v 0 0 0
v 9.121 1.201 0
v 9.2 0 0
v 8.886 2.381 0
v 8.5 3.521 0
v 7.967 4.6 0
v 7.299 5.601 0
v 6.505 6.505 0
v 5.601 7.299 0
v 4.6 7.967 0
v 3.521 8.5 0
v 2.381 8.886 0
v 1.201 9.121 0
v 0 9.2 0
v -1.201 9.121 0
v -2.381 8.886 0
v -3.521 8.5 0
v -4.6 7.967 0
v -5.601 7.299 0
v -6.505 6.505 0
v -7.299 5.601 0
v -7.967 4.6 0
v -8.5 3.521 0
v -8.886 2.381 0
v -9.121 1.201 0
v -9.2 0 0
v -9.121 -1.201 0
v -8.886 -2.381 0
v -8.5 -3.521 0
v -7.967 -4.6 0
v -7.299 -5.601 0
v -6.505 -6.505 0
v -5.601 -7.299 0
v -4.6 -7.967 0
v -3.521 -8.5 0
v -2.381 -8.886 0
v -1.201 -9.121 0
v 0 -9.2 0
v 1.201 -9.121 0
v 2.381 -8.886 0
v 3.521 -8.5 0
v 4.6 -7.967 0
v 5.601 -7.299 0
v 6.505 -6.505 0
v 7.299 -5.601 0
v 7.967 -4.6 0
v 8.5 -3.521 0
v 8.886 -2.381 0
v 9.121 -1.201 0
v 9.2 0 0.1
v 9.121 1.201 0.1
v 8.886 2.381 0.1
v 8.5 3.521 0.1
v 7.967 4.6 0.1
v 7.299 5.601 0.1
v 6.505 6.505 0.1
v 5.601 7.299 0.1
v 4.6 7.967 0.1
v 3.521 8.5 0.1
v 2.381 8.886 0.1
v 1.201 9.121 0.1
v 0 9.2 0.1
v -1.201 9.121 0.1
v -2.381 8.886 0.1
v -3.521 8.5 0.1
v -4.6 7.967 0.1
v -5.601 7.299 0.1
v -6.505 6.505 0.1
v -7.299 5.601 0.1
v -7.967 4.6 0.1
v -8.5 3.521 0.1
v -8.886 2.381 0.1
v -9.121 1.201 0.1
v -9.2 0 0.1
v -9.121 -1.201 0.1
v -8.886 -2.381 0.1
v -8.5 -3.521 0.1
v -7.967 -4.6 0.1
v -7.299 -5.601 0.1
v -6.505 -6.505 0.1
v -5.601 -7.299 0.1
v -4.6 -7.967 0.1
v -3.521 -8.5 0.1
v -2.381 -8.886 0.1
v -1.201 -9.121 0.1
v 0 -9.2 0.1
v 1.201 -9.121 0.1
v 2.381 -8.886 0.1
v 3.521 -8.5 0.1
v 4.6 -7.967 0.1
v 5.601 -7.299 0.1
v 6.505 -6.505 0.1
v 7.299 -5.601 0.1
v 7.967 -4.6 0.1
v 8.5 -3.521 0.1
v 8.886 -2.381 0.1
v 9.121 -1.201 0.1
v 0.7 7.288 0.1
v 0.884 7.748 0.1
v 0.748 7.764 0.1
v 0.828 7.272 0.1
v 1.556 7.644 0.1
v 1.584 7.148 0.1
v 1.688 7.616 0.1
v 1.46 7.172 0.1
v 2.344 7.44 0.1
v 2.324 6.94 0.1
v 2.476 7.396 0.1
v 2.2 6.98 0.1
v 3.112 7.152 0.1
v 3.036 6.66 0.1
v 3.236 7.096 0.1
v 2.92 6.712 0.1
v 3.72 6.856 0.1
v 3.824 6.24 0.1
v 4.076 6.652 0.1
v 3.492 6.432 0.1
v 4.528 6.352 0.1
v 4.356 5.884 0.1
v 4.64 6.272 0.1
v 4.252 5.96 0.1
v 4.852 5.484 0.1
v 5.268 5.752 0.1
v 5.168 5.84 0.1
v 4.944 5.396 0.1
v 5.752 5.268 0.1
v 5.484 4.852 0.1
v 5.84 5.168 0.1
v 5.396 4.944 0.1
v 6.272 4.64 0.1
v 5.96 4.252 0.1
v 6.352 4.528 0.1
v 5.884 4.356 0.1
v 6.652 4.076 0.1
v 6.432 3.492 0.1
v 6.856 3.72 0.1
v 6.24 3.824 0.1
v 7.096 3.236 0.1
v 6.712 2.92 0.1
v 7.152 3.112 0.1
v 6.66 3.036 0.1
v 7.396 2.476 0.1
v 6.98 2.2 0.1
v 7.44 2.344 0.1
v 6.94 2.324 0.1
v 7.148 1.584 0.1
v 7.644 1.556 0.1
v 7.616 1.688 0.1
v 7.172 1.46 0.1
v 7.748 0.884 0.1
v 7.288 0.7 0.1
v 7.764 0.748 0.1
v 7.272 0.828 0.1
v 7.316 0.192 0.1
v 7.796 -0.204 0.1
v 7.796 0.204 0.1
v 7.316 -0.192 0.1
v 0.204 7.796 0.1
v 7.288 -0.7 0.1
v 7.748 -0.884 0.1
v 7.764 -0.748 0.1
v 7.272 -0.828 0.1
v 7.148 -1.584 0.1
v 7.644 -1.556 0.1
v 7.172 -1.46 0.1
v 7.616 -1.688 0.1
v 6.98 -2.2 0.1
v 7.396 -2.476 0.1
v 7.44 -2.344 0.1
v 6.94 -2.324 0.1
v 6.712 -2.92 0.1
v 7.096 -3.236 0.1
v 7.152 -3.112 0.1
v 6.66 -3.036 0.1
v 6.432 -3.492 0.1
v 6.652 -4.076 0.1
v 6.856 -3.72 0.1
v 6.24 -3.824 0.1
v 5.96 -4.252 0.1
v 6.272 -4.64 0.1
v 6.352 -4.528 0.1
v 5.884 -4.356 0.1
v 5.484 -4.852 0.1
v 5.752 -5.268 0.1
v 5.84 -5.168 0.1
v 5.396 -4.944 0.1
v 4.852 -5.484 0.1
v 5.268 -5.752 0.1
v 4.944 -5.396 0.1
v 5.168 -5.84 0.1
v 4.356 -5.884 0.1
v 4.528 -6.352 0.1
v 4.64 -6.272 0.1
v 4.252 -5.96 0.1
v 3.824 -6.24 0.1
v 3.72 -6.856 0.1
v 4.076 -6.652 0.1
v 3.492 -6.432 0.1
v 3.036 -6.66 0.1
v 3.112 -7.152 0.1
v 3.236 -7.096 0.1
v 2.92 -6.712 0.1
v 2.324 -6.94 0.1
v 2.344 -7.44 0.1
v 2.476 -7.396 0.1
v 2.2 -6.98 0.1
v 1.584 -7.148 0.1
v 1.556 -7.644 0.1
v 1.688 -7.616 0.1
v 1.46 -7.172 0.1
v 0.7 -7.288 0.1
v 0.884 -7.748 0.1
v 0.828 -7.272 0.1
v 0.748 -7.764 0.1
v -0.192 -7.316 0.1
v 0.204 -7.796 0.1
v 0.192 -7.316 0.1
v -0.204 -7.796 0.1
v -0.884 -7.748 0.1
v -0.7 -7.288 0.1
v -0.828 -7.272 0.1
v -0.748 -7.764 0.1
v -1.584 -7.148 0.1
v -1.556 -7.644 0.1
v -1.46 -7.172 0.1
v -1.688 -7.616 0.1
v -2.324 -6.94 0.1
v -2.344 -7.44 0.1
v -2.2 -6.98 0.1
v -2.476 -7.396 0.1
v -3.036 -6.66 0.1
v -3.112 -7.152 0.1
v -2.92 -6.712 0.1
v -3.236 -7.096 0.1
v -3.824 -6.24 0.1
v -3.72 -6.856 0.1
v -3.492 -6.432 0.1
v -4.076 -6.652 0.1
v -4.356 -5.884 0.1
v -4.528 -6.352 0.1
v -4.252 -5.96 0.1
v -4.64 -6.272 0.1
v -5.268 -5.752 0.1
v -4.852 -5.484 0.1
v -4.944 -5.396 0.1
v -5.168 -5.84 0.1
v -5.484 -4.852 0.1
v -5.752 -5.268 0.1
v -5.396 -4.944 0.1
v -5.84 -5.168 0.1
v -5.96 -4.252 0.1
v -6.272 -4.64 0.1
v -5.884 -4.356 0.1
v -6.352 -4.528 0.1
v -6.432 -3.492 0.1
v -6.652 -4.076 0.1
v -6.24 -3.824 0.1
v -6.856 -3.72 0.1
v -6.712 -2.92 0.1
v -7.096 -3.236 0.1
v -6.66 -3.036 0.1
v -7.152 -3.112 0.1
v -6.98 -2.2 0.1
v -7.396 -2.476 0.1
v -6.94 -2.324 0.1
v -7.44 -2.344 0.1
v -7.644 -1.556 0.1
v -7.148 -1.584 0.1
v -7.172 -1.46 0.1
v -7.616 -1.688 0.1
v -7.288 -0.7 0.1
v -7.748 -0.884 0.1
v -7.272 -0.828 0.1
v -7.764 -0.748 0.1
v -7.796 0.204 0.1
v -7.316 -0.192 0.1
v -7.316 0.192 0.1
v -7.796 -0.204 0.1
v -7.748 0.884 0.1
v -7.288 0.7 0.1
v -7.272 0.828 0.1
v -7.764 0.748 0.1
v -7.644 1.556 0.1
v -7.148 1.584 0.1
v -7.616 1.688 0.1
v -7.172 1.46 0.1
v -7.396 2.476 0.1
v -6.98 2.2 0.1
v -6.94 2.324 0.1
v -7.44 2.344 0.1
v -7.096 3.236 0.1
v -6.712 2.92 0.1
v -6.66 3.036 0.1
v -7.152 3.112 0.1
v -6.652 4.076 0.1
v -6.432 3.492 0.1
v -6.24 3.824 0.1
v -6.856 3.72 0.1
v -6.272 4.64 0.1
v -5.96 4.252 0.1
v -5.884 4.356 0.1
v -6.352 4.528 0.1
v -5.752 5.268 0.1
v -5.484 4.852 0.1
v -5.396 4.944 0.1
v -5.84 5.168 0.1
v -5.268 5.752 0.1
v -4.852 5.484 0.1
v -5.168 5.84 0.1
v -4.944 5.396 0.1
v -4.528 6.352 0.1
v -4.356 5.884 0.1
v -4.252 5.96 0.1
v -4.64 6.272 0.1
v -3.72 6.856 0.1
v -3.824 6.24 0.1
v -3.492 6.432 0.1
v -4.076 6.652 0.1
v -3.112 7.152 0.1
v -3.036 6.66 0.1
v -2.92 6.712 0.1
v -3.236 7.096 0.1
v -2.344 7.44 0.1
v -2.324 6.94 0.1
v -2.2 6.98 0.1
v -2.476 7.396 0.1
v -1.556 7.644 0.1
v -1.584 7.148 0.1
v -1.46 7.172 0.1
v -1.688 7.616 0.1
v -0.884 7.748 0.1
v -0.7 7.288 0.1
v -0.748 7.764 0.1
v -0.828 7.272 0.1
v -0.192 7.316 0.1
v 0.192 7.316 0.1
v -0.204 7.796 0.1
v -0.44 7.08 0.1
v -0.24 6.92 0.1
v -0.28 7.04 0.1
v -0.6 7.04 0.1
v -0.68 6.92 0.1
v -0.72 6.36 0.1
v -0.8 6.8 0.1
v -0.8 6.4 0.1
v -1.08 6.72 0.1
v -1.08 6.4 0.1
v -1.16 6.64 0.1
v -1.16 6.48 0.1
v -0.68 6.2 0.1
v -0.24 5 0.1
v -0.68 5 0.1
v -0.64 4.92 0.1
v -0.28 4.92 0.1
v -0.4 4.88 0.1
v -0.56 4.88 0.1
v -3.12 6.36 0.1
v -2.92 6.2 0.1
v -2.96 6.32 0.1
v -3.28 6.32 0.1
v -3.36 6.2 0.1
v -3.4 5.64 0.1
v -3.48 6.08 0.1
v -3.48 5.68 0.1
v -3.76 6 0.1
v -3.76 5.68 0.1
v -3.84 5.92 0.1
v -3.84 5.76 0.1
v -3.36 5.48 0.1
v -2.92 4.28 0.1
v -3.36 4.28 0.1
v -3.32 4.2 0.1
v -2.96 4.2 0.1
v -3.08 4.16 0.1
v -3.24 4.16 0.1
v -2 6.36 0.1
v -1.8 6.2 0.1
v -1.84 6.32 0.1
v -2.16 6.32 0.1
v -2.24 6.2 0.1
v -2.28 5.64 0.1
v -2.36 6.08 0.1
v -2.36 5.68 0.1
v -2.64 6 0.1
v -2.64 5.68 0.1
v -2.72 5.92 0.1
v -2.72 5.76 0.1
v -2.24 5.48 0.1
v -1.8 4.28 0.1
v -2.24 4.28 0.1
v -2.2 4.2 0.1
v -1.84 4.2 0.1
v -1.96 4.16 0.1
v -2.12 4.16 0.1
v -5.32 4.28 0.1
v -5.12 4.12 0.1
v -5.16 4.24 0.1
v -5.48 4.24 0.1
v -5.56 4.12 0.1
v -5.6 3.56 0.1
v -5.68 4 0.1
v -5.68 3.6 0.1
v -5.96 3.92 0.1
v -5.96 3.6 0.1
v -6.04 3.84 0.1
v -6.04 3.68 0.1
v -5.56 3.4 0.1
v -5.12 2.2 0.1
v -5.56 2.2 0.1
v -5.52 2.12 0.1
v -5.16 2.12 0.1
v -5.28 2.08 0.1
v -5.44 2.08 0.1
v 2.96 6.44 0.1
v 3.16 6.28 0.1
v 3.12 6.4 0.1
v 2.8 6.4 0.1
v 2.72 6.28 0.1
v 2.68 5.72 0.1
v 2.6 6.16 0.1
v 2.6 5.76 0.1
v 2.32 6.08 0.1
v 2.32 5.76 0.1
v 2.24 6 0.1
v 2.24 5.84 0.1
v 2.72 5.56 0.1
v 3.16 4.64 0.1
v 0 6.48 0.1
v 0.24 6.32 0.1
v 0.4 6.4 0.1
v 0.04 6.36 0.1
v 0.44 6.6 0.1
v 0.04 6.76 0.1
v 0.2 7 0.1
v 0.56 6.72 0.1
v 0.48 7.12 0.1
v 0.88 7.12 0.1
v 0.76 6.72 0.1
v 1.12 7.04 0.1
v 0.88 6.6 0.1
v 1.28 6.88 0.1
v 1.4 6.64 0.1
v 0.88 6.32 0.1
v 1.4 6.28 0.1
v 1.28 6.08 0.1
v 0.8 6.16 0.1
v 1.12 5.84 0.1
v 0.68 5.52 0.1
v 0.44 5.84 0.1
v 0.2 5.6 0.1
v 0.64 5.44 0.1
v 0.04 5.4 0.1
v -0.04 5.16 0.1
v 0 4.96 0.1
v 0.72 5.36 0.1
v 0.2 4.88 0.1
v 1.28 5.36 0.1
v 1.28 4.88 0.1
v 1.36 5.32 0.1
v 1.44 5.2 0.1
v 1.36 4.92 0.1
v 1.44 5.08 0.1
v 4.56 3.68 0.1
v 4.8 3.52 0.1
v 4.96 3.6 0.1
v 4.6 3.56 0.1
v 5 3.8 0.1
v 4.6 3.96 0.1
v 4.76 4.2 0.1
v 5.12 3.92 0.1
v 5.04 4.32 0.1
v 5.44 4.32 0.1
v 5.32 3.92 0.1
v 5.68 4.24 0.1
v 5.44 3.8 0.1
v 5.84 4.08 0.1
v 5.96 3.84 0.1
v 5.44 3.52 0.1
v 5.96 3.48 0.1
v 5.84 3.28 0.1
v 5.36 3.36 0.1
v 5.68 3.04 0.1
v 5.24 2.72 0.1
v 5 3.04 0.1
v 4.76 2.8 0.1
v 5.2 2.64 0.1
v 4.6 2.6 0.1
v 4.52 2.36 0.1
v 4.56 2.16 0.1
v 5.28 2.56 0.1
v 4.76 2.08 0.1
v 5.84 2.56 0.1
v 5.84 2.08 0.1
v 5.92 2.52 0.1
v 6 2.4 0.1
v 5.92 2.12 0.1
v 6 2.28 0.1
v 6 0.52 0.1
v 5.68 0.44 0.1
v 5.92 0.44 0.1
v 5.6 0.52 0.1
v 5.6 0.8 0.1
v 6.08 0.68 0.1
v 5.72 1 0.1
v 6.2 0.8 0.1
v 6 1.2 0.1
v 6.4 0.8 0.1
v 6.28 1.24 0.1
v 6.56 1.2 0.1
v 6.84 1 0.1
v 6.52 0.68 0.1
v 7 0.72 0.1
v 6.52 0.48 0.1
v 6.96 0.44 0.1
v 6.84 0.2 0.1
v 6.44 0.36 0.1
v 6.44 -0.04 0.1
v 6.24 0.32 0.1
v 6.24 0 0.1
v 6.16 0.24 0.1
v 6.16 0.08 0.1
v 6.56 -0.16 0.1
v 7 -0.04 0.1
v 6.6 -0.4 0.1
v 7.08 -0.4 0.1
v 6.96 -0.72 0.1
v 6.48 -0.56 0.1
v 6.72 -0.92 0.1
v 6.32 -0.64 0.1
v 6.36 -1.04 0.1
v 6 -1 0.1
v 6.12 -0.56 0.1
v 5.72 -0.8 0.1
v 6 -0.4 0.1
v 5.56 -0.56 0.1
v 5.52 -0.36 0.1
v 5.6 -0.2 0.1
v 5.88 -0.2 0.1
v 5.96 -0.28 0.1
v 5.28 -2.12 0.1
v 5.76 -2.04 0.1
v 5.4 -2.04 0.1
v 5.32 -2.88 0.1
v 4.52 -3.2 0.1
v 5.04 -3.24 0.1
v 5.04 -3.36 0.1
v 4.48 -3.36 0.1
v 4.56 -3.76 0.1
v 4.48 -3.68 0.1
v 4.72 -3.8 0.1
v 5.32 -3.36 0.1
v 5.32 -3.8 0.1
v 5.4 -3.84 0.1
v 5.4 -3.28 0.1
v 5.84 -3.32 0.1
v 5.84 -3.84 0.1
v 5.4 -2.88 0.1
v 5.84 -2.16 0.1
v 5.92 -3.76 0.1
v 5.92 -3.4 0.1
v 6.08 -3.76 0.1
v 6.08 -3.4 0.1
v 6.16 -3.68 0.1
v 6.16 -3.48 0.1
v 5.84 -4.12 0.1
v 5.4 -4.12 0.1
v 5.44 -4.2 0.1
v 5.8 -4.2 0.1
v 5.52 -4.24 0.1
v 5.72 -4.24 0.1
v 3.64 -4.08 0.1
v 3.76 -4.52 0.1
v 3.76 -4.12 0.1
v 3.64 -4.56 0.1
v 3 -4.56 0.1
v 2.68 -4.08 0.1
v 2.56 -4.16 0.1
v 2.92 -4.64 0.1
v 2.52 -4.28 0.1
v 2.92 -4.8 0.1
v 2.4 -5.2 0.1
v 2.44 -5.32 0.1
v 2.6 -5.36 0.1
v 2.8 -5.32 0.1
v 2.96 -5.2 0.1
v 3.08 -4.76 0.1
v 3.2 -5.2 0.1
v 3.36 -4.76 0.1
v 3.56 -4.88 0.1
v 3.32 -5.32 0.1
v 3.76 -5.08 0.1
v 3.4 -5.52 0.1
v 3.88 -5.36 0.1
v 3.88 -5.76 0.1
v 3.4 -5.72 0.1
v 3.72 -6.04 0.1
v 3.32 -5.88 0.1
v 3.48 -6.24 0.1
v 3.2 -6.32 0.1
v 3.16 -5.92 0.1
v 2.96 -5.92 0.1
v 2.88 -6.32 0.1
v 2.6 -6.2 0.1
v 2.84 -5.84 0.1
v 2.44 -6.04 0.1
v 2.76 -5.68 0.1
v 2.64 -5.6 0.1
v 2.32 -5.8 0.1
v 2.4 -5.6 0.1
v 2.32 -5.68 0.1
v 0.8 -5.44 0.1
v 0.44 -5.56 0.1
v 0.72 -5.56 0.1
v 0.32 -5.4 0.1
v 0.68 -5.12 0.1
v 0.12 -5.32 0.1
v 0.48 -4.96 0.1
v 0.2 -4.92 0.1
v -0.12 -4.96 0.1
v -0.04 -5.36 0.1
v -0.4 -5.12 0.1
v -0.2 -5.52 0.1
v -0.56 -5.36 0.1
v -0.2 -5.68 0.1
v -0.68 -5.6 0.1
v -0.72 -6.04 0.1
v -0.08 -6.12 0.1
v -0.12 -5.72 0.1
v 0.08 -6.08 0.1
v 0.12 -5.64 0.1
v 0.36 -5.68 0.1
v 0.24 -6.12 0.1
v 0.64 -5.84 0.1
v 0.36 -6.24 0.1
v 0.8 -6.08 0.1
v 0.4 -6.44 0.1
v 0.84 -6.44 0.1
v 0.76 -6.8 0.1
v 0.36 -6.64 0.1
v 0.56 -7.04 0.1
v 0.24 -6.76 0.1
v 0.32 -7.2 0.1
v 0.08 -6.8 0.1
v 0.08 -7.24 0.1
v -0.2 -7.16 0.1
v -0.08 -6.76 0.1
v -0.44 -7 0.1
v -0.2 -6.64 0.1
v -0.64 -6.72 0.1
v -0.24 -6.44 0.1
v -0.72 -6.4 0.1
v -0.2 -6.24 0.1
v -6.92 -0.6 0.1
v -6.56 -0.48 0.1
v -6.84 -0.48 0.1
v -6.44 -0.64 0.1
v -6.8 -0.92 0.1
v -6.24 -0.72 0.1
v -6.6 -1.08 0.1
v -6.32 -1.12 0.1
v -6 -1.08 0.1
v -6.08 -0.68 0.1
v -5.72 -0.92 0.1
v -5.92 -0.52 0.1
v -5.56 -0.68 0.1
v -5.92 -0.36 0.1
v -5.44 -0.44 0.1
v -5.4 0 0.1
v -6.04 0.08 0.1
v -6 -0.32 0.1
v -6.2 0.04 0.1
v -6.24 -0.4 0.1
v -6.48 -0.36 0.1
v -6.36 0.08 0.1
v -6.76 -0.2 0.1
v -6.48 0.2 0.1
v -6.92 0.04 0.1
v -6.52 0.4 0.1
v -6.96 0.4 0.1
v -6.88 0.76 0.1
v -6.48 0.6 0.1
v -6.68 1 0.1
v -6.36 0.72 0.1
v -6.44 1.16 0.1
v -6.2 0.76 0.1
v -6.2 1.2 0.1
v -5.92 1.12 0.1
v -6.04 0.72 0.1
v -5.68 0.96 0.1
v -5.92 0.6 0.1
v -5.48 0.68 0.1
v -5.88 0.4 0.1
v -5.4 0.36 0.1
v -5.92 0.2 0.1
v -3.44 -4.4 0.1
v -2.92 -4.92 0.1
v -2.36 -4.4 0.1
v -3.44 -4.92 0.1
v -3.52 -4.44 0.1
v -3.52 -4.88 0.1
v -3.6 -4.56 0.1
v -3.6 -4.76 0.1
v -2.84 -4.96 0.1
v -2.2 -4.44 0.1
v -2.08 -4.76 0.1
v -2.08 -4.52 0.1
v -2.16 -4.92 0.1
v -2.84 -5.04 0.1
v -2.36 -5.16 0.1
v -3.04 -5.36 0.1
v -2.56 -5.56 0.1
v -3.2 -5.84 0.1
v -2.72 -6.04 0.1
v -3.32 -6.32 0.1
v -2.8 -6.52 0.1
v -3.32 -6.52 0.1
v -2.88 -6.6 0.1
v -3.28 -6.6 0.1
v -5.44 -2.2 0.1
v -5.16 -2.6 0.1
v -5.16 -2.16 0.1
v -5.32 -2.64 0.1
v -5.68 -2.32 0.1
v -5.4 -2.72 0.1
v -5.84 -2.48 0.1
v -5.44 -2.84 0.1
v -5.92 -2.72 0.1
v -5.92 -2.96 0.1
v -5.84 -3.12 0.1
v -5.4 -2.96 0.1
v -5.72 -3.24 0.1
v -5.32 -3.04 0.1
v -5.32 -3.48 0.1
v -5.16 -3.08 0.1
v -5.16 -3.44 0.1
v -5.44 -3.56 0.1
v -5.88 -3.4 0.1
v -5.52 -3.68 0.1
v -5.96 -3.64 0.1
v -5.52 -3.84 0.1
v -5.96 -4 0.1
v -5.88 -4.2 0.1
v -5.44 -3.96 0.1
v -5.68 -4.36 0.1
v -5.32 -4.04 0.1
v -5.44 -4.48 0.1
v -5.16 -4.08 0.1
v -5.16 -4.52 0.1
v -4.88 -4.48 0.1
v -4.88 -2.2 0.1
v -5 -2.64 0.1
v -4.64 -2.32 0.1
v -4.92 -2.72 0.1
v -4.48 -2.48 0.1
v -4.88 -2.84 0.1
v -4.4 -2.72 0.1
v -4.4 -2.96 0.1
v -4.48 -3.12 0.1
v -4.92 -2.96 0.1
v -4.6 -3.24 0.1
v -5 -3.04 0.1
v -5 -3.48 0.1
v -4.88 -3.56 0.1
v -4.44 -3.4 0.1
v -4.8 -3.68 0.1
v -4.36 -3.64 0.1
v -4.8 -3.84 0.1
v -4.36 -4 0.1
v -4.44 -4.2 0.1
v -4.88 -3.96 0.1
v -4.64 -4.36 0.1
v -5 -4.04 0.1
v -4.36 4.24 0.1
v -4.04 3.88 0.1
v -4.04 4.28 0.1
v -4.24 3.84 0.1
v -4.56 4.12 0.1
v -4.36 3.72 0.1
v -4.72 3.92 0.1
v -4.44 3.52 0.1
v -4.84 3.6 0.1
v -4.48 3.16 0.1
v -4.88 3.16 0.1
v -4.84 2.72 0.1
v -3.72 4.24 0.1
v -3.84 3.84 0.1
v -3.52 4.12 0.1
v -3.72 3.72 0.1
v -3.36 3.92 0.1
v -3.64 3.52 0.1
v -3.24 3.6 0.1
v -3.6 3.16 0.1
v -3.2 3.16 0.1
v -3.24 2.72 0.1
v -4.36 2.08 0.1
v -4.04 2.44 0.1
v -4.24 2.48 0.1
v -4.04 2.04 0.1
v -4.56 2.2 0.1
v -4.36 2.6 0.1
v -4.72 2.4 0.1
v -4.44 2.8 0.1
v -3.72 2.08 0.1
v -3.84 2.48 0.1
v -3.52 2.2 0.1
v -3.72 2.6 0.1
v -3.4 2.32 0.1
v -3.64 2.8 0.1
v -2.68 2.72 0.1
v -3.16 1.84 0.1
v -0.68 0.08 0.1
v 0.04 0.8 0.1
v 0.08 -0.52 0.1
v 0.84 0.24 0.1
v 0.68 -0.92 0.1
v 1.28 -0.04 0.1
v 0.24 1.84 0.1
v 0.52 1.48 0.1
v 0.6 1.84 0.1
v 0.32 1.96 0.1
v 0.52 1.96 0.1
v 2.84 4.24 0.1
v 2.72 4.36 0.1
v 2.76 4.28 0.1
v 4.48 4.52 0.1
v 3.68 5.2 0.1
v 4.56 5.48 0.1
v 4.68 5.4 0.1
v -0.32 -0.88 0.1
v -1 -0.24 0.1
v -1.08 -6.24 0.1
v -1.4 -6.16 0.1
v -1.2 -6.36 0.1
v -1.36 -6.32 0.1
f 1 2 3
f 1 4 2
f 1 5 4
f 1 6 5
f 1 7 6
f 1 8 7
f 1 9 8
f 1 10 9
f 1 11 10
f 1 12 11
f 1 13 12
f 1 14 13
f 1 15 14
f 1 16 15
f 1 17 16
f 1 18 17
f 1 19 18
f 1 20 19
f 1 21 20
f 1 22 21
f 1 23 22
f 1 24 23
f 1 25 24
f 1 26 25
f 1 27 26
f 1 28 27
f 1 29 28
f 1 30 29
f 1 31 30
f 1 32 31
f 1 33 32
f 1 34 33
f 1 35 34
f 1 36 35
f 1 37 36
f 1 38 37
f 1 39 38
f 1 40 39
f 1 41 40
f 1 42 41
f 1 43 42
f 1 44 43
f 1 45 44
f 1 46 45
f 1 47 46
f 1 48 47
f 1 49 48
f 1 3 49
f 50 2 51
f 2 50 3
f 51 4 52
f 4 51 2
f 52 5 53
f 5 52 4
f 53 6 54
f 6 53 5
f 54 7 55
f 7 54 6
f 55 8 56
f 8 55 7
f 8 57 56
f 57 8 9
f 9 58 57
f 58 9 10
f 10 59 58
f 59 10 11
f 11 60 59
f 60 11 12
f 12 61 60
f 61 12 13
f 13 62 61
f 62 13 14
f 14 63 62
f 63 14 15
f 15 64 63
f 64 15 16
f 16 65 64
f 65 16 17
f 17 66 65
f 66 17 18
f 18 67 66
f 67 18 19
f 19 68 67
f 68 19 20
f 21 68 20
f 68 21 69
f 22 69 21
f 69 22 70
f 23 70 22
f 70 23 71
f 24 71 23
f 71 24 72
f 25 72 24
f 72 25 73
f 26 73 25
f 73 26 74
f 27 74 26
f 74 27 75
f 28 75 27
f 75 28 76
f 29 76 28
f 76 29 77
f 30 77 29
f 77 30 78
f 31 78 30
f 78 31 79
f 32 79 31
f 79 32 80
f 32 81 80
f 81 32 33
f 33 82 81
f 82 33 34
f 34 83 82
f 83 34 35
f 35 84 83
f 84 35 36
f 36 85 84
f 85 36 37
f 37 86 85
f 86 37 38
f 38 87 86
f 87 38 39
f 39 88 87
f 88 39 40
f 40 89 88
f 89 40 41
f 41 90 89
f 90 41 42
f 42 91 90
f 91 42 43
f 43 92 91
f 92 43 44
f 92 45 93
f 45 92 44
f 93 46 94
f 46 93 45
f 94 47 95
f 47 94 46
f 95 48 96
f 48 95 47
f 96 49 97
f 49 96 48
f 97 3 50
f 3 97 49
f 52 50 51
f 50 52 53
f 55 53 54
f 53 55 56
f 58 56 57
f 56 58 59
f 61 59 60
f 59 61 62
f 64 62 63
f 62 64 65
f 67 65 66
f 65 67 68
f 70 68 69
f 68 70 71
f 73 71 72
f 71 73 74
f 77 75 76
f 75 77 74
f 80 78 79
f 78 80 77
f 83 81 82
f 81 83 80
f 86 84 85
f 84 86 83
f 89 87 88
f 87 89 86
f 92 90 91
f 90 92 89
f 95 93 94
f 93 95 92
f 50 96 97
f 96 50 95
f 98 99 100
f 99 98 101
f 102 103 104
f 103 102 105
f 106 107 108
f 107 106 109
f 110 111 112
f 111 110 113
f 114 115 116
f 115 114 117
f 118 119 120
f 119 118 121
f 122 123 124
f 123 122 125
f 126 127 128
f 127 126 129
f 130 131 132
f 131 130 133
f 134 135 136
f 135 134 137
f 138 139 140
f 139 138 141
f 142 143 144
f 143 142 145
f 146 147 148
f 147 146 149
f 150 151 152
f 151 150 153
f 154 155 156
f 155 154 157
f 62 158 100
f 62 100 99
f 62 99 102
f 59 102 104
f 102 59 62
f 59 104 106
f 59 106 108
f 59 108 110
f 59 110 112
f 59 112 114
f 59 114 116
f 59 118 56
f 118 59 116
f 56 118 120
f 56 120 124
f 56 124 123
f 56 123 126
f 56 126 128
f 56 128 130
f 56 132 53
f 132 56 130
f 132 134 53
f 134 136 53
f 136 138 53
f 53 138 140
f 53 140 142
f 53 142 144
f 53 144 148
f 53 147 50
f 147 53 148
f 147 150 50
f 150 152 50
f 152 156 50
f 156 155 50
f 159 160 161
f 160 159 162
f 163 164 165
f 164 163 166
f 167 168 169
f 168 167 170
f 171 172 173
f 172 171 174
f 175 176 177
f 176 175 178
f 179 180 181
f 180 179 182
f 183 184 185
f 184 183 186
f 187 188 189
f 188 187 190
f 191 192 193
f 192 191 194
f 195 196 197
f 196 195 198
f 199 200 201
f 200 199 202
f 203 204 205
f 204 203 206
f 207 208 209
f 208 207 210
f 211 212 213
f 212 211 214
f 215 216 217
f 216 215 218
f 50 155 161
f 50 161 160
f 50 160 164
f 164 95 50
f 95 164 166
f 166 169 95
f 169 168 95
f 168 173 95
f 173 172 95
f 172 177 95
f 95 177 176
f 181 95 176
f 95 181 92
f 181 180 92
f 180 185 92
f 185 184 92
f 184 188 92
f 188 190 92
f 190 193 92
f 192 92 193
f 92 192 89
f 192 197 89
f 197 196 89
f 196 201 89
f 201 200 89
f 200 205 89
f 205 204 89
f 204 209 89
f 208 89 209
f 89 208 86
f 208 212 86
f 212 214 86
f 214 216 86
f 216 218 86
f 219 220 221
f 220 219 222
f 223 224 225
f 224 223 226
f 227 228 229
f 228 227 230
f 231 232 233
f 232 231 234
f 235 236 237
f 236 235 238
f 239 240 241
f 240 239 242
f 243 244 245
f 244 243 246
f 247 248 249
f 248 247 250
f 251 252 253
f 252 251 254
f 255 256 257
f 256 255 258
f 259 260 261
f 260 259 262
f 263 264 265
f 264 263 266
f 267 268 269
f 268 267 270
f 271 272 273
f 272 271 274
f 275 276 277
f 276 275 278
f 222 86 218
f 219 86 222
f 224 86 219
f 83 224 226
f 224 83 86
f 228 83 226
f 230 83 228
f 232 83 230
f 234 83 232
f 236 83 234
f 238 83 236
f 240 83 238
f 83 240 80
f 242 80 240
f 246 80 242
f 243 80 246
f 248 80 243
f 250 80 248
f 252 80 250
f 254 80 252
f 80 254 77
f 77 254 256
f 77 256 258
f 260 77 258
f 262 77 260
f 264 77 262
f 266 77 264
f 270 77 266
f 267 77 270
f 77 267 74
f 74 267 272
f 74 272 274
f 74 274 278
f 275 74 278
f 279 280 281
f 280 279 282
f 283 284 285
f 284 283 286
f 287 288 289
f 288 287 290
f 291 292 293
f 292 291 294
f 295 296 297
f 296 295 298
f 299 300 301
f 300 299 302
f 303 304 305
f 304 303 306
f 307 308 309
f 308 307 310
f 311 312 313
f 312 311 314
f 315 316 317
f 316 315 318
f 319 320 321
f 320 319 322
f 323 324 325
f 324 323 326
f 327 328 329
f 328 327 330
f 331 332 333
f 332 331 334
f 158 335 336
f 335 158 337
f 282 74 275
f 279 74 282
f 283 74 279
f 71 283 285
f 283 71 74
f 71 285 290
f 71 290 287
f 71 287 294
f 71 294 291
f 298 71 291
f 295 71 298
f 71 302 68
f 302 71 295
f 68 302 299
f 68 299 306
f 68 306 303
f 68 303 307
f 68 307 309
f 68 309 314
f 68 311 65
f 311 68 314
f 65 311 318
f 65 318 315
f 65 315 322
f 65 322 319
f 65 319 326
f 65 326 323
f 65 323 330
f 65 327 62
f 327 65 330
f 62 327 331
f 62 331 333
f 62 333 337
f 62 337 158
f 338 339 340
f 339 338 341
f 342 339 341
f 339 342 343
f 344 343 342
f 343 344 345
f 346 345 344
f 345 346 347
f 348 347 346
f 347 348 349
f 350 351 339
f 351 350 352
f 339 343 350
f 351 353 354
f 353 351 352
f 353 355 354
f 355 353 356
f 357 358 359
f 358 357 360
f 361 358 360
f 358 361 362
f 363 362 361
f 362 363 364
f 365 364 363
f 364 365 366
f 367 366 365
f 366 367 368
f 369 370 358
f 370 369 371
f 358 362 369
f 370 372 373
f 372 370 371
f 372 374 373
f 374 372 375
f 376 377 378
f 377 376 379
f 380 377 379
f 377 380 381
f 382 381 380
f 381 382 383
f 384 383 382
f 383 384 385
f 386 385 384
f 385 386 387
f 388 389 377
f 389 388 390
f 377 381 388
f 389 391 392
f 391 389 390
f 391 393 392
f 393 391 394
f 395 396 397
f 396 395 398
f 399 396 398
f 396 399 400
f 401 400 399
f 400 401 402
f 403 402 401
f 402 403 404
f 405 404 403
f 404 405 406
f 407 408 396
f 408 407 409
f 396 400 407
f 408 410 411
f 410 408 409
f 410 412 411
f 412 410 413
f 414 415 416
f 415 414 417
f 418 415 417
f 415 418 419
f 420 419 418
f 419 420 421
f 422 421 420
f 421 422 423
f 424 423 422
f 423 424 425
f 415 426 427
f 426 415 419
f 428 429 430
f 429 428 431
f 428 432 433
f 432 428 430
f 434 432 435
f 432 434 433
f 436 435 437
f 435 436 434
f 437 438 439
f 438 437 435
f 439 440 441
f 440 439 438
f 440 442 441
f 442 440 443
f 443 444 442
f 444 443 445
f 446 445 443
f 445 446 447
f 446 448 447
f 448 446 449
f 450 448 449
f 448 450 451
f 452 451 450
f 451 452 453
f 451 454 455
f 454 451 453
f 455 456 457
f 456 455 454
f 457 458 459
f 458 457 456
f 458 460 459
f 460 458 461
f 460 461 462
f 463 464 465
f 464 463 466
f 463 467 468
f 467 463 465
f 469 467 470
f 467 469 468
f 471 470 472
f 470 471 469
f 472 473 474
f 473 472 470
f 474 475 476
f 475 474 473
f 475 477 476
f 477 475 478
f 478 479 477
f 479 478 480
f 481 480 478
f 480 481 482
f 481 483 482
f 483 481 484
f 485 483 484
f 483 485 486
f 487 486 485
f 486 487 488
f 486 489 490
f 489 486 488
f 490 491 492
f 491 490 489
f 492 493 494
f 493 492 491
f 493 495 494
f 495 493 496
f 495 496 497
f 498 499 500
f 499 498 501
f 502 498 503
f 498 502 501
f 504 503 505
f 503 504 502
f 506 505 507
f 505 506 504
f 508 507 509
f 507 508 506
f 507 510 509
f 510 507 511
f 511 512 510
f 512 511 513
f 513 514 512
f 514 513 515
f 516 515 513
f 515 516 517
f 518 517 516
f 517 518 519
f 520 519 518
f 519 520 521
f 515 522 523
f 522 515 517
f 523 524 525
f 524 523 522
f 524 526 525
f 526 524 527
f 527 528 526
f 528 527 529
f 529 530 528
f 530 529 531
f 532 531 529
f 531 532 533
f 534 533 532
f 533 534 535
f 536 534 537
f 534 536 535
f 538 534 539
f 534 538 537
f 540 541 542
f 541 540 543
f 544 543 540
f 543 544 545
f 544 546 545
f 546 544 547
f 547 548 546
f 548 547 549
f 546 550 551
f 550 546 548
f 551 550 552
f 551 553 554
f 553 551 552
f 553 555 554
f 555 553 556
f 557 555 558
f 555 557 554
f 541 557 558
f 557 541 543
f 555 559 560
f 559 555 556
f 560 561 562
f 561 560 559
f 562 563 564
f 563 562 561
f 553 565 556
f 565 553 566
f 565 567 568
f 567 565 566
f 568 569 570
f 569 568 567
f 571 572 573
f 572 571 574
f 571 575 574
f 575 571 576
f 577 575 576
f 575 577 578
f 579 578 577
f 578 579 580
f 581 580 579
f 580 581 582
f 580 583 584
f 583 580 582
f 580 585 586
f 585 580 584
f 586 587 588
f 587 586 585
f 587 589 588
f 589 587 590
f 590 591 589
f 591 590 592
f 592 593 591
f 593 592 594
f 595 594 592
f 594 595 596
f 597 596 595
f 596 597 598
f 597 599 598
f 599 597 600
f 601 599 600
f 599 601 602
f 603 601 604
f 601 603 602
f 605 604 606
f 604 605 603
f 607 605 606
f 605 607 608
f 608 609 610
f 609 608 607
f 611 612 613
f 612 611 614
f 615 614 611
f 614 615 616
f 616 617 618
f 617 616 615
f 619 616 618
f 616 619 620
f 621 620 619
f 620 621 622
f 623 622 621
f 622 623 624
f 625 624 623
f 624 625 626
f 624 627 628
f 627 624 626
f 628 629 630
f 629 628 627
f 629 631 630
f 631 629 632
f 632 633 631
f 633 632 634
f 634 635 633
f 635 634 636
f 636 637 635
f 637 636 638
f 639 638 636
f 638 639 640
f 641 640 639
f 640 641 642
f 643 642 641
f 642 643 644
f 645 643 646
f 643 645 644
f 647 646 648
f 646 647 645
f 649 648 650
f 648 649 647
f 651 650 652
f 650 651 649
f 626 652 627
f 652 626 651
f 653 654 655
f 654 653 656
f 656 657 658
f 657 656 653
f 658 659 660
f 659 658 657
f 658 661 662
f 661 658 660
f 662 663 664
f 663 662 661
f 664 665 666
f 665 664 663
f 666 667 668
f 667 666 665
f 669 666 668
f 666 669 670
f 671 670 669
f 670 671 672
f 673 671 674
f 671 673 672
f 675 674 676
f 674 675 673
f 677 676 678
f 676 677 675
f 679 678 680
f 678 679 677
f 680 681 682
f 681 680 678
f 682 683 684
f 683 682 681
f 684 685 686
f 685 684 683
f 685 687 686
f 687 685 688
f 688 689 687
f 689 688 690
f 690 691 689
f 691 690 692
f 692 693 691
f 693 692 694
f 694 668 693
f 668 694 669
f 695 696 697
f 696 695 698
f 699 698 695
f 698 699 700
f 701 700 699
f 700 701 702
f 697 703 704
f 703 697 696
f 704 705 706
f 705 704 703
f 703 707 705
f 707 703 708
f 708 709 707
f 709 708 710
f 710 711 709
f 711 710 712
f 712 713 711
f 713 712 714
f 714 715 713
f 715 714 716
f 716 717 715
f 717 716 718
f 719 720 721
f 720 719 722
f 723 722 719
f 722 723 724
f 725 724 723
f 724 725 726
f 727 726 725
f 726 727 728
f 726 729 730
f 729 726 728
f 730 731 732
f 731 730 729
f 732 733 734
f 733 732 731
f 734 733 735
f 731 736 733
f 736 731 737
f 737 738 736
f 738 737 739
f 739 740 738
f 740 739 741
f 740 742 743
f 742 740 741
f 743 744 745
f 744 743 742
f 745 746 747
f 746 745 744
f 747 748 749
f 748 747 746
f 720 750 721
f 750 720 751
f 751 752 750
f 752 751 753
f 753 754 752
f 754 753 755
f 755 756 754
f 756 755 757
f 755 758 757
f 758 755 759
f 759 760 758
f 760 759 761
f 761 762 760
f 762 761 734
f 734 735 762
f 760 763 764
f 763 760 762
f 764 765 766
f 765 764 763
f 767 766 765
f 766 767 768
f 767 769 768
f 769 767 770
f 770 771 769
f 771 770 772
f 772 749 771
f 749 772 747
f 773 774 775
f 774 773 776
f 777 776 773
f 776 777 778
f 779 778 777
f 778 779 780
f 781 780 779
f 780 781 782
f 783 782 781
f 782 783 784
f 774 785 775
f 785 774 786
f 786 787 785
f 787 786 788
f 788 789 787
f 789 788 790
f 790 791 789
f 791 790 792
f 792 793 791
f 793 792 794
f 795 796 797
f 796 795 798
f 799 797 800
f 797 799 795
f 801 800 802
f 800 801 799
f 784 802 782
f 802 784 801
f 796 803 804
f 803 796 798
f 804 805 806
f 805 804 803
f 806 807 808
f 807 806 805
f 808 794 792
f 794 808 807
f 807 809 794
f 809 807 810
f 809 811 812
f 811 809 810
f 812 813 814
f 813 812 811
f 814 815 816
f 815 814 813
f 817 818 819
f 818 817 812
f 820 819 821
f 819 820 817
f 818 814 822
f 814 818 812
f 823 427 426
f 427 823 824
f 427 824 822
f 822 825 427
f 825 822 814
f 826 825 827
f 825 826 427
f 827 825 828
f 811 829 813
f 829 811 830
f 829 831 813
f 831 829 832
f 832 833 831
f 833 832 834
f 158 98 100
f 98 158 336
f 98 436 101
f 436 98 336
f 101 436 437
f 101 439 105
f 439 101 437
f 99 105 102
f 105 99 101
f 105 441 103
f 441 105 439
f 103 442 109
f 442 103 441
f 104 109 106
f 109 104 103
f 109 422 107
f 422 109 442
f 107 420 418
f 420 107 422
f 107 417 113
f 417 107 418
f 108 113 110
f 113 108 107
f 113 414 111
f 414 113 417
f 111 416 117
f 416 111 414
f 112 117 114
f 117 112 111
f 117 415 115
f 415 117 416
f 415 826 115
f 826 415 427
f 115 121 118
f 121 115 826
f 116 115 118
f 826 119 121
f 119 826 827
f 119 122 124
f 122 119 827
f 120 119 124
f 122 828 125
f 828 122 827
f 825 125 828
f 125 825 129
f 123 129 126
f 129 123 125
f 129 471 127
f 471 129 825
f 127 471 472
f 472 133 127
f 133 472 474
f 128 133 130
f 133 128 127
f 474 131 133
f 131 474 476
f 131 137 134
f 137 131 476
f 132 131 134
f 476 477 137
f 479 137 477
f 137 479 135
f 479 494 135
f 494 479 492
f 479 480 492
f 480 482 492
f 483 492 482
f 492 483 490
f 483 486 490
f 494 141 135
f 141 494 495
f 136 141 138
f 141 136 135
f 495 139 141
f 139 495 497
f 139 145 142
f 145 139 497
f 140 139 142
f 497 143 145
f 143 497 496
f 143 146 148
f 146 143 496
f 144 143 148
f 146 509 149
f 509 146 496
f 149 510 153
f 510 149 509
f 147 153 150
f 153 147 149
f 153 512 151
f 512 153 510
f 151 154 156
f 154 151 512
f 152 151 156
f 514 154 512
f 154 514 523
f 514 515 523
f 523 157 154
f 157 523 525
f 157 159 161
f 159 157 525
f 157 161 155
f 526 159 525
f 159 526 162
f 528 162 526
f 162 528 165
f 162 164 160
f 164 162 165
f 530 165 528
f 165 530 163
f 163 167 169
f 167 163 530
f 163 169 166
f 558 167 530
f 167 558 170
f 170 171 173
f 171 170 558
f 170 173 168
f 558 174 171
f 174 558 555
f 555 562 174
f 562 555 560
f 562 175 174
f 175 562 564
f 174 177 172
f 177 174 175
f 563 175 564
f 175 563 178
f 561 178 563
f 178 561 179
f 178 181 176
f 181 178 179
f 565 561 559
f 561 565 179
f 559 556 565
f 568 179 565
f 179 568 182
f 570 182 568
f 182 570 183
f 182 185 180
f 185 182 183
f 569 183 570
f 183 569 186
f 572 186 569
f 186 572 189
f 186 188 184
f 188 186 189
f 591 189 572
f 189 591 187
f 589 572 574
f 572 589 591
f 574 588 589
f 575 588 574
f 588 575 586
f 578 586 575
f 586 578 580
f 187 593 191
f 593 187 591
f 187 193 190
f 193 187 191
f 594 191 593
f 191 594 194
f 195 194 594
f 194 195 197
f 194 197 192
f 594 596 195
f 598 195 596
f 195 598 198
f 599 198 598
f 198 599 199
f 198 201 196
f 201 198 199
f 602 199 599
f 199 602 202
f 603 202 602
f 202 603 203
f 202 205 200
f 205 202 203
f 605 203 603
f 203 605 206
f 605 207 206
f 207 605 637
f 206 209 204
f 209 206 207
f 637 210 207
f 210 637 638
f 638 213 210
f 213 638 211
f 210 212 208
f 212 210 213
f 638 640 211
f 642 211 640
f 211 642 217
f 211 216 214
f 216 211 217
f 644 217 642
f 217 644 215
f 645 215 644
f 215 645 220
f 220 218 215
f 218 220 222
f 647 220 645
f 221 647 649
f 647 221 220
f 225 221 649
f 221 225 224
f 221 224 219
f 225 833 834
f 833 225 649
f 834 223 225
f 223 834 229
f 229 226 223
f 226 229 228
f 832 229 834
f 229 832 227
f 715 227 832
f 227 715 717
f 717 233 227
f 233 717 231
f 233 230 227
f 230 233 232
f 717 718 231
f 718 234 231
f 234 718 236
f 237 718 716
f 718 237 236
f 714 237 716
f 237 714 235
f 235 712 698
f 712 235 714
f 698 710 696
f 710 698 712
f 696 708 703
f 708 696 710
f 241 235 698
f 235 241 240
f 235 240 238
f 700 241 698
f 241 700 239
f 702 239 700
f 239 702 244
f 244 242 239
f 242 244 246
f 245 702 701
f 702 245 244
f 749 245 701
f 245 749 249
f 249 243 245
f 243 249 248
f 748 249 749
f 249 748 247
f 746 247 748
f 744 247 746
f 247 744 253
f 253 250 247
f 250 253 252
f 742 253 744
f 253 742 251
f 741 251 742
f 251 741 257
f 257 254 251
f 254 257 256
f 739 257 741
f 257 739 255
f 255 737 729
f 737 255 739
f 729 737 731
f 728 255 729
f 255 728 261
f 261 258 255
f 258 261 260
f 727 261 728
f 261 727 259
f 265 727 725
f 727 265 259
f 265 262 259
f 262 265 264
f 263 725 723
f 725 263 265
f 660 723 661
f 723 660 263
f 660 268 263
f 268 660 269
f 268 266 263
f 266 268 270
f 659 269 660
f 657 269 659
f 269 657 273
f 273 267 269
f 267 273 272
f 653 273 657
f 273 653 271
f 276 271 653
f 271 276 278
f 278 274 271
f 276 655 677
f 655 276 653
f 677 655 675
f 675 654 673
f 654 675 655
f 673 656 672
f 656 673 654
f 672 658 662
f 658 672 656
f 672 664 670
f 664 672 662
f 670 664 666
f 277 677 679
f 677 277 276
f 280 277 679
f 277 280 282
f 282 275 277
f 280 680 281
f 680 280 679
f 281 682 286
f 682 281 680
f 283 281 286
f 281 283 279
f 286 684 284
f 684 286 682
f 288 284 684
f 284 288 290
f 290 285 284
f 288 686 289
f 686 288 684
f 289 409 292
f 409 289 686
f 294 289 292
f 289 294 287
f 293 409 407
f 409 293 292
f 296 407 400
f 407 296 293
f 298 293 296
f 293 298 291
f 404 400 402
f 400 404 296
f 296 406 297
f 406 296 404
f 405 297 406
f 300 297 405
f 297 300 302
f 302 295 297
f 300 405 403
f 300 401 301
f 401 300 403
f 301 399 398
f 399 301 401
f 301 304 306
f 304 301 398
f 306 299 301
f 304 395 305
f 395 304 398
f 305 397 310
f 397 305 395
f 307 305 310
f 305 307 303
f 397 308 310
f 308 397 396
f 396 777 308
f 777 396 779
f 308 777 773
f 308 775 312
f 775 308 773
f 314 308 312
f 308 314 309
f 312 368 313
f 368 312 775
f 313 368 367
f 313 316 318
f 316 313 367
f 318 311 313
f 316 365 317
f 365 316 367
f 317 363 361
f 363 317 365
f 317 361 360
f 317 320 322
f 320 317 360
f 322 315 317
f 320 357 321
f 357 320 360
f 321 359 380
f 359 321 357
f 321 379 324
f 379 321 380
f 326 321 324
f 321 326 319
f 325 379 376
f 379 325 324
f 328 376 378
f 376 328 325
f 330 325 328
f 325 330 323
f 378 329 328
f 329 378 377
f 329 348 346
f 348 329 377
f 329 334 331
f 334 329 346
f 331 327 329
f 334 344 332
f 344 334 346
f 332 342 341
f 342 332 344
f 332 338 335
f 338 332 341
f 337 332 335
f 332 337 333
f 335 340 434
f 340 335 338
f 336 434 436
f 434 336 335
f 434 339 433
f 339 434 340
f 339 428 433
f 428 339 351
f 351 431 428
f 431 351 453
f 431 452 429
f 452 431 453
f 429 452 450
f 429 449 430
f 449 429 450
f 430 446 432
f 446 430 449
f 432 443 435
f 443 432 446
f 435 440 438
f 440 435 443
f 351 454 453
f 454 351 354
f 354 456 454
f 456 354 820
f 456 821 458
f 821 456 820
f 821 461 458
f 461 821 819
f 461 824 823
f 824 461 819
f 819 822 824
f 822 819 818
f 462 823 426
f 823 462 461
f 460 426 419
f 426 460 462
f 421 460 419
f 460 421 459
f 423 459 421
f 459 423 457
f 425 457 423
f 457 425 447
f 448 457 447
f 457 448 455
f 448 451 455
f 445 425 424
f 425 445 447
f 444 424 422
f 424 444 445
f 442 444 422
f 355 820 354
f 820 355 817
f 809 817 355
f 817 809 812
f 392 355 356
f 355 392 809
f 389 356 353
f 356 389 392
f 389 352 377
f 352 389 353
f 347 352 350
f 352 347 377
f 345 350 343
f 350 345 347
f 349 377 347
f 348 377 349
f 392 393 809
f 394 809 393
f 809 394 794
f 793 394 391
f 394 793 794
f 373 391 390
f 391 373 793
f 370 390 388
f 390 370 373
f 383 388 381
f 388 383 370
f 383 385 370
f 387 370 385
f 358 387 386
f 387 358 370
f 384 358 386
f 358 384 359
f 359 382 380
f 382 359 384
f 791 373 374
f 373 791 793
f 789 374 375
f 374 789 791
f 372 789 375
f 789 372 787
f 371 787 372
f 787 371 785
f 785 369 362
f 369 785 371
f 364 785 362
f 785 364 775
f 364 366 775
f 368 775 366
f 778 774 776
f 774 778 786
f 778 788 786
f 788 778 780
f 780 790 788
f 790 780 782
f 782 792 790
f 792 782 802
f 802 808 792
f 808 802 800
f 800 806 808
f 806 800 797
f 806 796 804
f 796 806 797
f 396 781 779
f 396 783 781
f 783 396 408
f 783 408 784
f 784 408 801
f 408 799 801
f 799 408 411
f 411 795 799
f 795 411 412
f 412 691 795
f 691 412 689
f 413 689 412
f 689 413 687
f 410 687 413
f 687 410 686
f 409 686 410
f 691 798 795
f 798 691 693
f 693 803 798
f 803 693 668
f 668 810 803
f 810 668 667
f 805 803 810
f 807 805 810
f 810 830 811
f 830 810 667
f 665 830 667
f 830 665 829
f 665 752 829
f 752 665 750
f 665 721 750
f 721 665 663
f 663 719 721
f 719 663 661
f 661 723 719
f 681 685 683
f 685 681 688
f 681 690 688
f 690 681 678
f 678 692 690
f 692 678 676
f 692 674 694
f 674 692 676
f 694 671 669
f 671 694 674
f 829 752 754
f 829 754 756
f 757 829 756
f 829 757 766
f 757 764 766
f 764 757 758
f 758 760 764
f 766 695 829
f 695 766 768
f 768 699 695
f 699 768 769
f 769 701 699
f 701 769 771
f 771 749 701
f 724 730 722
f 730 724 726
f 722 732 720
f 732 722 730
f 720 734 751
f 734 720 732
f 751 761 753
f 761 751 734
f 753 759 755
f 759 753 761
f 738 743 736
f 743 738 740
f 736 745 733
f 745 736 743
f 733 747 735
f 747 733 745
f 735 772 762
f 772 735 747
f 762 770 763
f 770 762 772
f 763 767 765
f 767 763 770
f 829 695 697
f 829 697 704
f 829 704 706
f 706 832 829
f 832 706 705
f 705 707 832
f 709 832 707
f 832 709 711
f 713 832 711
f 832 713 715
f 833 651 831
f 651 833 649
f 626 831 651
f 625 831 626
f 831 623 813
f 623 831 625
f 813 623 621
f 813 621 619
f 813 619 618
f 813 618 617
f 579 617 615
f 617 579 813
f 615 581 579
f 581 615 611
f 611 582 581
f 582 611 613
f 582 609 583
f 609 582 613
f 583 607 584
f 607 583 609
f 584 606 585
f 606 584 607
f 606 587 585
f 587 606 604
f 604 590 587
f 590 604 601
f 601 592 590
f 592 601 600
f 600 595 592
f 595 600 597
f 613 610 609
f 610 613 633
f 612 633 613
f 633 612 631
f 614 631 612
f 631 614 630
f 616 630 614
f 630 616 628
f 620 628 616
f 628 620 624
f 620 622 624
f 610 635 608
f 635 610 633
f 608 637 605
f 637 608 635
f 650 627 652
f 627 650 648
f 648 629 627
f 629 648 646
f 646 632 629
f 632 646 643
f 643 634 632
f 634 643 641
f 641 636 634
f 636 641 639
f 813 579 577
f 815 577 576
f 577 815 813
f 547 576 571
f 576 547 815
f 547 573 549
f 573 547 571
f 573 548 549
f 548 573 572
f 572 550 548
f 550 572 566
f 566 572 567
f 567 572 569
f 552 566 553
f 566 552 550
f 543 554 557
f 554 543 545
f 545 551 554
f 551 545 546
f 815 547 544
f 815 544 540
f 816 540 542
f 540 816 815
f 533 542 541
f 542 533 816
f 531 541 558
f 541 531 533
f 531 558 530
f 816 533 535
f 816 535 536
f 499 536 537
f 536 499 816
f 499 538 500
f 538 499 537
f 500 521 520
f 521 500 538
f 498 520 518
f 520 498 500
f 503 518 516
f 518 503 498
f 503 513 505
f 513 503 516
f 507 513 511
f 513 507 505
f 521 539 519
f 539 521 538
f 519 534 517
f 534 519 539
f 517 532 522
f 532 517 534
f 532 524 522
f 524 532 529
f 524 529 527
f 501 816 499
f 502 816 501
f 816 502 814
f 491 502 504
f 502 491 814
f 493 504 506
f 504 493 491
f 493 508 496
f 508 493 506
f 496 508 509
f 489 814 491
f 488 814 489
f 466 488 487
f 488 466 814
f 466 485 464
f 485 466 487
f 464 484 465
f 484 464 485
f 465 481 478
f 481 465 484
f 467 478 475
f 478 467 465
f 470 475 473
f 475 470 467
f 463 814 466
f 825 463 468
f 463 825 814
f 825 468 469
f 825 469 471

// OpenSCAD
use <../lib.scad>
use <../p/48/4-4cylc3.scad>
use <s/004659cs01.scad>
$fa=1; $fs=0.2;
function ldraw_lib__004659c(realsolid=false) = [
// 0 Sticker  2.3 x  2.3 Round with Clock Hands 10:06:32
// 0 Name: 004659c.dat
// 0 Author: Alex Taylor [anathema]
// 0 !LDRAW_ORG Part UPDATE 2022-06
// 0 !LICENSE Licensed under CC BY 2.0 and CC BY 4.0 : see CAreadme.txt
// 
// 0 BFC CERTIFY CCW
  [0,"BFC","CERTIFY"],
  [0,"BFC","CCW"],
// 
// 0 !KEYWORDS Fire Station, Set 374-1, Set 590-1
// 
// 0 !HISTORY 2019-08-04 [anathema] Original pattern using TEXMAP
// 0 !HISTORY 2021-03-09 [RainbowDolphin] Vectorized the pattern
// 0 !HISTORY 2022-12-20 [PTadmin] Official Update 2022-06
// 
// 
// 1 16 0 0 0 23 0 0 0 -0.25 0 0 0 23 48\4-4cylc3.dat
  [1,16,0,0,0,23,0,0,0,-0.25,0,0,0,23, ldraw_lib__48__4_4cylc3(realsolid)],
// 1 16 0 0 0 1 0 0 0 1 0 0 0 1 s\004659cs01.dat
  [1,16,0,0,0,1,0,0,0,1,0,0,0,1, ldraw_lib__s__004659cs01(realsolid)],
];
module ldraw_lib__004659c(step=0, col=false, unit=2/5, alt=false, line=0.2, solid=!$preview)
    makepoly(ldraw_lib__004659c(solid), step=step, col=col, unit=unit, alt=alt, line=line, solid=solid);
ldraw_lib__004659c(line=0.2);
